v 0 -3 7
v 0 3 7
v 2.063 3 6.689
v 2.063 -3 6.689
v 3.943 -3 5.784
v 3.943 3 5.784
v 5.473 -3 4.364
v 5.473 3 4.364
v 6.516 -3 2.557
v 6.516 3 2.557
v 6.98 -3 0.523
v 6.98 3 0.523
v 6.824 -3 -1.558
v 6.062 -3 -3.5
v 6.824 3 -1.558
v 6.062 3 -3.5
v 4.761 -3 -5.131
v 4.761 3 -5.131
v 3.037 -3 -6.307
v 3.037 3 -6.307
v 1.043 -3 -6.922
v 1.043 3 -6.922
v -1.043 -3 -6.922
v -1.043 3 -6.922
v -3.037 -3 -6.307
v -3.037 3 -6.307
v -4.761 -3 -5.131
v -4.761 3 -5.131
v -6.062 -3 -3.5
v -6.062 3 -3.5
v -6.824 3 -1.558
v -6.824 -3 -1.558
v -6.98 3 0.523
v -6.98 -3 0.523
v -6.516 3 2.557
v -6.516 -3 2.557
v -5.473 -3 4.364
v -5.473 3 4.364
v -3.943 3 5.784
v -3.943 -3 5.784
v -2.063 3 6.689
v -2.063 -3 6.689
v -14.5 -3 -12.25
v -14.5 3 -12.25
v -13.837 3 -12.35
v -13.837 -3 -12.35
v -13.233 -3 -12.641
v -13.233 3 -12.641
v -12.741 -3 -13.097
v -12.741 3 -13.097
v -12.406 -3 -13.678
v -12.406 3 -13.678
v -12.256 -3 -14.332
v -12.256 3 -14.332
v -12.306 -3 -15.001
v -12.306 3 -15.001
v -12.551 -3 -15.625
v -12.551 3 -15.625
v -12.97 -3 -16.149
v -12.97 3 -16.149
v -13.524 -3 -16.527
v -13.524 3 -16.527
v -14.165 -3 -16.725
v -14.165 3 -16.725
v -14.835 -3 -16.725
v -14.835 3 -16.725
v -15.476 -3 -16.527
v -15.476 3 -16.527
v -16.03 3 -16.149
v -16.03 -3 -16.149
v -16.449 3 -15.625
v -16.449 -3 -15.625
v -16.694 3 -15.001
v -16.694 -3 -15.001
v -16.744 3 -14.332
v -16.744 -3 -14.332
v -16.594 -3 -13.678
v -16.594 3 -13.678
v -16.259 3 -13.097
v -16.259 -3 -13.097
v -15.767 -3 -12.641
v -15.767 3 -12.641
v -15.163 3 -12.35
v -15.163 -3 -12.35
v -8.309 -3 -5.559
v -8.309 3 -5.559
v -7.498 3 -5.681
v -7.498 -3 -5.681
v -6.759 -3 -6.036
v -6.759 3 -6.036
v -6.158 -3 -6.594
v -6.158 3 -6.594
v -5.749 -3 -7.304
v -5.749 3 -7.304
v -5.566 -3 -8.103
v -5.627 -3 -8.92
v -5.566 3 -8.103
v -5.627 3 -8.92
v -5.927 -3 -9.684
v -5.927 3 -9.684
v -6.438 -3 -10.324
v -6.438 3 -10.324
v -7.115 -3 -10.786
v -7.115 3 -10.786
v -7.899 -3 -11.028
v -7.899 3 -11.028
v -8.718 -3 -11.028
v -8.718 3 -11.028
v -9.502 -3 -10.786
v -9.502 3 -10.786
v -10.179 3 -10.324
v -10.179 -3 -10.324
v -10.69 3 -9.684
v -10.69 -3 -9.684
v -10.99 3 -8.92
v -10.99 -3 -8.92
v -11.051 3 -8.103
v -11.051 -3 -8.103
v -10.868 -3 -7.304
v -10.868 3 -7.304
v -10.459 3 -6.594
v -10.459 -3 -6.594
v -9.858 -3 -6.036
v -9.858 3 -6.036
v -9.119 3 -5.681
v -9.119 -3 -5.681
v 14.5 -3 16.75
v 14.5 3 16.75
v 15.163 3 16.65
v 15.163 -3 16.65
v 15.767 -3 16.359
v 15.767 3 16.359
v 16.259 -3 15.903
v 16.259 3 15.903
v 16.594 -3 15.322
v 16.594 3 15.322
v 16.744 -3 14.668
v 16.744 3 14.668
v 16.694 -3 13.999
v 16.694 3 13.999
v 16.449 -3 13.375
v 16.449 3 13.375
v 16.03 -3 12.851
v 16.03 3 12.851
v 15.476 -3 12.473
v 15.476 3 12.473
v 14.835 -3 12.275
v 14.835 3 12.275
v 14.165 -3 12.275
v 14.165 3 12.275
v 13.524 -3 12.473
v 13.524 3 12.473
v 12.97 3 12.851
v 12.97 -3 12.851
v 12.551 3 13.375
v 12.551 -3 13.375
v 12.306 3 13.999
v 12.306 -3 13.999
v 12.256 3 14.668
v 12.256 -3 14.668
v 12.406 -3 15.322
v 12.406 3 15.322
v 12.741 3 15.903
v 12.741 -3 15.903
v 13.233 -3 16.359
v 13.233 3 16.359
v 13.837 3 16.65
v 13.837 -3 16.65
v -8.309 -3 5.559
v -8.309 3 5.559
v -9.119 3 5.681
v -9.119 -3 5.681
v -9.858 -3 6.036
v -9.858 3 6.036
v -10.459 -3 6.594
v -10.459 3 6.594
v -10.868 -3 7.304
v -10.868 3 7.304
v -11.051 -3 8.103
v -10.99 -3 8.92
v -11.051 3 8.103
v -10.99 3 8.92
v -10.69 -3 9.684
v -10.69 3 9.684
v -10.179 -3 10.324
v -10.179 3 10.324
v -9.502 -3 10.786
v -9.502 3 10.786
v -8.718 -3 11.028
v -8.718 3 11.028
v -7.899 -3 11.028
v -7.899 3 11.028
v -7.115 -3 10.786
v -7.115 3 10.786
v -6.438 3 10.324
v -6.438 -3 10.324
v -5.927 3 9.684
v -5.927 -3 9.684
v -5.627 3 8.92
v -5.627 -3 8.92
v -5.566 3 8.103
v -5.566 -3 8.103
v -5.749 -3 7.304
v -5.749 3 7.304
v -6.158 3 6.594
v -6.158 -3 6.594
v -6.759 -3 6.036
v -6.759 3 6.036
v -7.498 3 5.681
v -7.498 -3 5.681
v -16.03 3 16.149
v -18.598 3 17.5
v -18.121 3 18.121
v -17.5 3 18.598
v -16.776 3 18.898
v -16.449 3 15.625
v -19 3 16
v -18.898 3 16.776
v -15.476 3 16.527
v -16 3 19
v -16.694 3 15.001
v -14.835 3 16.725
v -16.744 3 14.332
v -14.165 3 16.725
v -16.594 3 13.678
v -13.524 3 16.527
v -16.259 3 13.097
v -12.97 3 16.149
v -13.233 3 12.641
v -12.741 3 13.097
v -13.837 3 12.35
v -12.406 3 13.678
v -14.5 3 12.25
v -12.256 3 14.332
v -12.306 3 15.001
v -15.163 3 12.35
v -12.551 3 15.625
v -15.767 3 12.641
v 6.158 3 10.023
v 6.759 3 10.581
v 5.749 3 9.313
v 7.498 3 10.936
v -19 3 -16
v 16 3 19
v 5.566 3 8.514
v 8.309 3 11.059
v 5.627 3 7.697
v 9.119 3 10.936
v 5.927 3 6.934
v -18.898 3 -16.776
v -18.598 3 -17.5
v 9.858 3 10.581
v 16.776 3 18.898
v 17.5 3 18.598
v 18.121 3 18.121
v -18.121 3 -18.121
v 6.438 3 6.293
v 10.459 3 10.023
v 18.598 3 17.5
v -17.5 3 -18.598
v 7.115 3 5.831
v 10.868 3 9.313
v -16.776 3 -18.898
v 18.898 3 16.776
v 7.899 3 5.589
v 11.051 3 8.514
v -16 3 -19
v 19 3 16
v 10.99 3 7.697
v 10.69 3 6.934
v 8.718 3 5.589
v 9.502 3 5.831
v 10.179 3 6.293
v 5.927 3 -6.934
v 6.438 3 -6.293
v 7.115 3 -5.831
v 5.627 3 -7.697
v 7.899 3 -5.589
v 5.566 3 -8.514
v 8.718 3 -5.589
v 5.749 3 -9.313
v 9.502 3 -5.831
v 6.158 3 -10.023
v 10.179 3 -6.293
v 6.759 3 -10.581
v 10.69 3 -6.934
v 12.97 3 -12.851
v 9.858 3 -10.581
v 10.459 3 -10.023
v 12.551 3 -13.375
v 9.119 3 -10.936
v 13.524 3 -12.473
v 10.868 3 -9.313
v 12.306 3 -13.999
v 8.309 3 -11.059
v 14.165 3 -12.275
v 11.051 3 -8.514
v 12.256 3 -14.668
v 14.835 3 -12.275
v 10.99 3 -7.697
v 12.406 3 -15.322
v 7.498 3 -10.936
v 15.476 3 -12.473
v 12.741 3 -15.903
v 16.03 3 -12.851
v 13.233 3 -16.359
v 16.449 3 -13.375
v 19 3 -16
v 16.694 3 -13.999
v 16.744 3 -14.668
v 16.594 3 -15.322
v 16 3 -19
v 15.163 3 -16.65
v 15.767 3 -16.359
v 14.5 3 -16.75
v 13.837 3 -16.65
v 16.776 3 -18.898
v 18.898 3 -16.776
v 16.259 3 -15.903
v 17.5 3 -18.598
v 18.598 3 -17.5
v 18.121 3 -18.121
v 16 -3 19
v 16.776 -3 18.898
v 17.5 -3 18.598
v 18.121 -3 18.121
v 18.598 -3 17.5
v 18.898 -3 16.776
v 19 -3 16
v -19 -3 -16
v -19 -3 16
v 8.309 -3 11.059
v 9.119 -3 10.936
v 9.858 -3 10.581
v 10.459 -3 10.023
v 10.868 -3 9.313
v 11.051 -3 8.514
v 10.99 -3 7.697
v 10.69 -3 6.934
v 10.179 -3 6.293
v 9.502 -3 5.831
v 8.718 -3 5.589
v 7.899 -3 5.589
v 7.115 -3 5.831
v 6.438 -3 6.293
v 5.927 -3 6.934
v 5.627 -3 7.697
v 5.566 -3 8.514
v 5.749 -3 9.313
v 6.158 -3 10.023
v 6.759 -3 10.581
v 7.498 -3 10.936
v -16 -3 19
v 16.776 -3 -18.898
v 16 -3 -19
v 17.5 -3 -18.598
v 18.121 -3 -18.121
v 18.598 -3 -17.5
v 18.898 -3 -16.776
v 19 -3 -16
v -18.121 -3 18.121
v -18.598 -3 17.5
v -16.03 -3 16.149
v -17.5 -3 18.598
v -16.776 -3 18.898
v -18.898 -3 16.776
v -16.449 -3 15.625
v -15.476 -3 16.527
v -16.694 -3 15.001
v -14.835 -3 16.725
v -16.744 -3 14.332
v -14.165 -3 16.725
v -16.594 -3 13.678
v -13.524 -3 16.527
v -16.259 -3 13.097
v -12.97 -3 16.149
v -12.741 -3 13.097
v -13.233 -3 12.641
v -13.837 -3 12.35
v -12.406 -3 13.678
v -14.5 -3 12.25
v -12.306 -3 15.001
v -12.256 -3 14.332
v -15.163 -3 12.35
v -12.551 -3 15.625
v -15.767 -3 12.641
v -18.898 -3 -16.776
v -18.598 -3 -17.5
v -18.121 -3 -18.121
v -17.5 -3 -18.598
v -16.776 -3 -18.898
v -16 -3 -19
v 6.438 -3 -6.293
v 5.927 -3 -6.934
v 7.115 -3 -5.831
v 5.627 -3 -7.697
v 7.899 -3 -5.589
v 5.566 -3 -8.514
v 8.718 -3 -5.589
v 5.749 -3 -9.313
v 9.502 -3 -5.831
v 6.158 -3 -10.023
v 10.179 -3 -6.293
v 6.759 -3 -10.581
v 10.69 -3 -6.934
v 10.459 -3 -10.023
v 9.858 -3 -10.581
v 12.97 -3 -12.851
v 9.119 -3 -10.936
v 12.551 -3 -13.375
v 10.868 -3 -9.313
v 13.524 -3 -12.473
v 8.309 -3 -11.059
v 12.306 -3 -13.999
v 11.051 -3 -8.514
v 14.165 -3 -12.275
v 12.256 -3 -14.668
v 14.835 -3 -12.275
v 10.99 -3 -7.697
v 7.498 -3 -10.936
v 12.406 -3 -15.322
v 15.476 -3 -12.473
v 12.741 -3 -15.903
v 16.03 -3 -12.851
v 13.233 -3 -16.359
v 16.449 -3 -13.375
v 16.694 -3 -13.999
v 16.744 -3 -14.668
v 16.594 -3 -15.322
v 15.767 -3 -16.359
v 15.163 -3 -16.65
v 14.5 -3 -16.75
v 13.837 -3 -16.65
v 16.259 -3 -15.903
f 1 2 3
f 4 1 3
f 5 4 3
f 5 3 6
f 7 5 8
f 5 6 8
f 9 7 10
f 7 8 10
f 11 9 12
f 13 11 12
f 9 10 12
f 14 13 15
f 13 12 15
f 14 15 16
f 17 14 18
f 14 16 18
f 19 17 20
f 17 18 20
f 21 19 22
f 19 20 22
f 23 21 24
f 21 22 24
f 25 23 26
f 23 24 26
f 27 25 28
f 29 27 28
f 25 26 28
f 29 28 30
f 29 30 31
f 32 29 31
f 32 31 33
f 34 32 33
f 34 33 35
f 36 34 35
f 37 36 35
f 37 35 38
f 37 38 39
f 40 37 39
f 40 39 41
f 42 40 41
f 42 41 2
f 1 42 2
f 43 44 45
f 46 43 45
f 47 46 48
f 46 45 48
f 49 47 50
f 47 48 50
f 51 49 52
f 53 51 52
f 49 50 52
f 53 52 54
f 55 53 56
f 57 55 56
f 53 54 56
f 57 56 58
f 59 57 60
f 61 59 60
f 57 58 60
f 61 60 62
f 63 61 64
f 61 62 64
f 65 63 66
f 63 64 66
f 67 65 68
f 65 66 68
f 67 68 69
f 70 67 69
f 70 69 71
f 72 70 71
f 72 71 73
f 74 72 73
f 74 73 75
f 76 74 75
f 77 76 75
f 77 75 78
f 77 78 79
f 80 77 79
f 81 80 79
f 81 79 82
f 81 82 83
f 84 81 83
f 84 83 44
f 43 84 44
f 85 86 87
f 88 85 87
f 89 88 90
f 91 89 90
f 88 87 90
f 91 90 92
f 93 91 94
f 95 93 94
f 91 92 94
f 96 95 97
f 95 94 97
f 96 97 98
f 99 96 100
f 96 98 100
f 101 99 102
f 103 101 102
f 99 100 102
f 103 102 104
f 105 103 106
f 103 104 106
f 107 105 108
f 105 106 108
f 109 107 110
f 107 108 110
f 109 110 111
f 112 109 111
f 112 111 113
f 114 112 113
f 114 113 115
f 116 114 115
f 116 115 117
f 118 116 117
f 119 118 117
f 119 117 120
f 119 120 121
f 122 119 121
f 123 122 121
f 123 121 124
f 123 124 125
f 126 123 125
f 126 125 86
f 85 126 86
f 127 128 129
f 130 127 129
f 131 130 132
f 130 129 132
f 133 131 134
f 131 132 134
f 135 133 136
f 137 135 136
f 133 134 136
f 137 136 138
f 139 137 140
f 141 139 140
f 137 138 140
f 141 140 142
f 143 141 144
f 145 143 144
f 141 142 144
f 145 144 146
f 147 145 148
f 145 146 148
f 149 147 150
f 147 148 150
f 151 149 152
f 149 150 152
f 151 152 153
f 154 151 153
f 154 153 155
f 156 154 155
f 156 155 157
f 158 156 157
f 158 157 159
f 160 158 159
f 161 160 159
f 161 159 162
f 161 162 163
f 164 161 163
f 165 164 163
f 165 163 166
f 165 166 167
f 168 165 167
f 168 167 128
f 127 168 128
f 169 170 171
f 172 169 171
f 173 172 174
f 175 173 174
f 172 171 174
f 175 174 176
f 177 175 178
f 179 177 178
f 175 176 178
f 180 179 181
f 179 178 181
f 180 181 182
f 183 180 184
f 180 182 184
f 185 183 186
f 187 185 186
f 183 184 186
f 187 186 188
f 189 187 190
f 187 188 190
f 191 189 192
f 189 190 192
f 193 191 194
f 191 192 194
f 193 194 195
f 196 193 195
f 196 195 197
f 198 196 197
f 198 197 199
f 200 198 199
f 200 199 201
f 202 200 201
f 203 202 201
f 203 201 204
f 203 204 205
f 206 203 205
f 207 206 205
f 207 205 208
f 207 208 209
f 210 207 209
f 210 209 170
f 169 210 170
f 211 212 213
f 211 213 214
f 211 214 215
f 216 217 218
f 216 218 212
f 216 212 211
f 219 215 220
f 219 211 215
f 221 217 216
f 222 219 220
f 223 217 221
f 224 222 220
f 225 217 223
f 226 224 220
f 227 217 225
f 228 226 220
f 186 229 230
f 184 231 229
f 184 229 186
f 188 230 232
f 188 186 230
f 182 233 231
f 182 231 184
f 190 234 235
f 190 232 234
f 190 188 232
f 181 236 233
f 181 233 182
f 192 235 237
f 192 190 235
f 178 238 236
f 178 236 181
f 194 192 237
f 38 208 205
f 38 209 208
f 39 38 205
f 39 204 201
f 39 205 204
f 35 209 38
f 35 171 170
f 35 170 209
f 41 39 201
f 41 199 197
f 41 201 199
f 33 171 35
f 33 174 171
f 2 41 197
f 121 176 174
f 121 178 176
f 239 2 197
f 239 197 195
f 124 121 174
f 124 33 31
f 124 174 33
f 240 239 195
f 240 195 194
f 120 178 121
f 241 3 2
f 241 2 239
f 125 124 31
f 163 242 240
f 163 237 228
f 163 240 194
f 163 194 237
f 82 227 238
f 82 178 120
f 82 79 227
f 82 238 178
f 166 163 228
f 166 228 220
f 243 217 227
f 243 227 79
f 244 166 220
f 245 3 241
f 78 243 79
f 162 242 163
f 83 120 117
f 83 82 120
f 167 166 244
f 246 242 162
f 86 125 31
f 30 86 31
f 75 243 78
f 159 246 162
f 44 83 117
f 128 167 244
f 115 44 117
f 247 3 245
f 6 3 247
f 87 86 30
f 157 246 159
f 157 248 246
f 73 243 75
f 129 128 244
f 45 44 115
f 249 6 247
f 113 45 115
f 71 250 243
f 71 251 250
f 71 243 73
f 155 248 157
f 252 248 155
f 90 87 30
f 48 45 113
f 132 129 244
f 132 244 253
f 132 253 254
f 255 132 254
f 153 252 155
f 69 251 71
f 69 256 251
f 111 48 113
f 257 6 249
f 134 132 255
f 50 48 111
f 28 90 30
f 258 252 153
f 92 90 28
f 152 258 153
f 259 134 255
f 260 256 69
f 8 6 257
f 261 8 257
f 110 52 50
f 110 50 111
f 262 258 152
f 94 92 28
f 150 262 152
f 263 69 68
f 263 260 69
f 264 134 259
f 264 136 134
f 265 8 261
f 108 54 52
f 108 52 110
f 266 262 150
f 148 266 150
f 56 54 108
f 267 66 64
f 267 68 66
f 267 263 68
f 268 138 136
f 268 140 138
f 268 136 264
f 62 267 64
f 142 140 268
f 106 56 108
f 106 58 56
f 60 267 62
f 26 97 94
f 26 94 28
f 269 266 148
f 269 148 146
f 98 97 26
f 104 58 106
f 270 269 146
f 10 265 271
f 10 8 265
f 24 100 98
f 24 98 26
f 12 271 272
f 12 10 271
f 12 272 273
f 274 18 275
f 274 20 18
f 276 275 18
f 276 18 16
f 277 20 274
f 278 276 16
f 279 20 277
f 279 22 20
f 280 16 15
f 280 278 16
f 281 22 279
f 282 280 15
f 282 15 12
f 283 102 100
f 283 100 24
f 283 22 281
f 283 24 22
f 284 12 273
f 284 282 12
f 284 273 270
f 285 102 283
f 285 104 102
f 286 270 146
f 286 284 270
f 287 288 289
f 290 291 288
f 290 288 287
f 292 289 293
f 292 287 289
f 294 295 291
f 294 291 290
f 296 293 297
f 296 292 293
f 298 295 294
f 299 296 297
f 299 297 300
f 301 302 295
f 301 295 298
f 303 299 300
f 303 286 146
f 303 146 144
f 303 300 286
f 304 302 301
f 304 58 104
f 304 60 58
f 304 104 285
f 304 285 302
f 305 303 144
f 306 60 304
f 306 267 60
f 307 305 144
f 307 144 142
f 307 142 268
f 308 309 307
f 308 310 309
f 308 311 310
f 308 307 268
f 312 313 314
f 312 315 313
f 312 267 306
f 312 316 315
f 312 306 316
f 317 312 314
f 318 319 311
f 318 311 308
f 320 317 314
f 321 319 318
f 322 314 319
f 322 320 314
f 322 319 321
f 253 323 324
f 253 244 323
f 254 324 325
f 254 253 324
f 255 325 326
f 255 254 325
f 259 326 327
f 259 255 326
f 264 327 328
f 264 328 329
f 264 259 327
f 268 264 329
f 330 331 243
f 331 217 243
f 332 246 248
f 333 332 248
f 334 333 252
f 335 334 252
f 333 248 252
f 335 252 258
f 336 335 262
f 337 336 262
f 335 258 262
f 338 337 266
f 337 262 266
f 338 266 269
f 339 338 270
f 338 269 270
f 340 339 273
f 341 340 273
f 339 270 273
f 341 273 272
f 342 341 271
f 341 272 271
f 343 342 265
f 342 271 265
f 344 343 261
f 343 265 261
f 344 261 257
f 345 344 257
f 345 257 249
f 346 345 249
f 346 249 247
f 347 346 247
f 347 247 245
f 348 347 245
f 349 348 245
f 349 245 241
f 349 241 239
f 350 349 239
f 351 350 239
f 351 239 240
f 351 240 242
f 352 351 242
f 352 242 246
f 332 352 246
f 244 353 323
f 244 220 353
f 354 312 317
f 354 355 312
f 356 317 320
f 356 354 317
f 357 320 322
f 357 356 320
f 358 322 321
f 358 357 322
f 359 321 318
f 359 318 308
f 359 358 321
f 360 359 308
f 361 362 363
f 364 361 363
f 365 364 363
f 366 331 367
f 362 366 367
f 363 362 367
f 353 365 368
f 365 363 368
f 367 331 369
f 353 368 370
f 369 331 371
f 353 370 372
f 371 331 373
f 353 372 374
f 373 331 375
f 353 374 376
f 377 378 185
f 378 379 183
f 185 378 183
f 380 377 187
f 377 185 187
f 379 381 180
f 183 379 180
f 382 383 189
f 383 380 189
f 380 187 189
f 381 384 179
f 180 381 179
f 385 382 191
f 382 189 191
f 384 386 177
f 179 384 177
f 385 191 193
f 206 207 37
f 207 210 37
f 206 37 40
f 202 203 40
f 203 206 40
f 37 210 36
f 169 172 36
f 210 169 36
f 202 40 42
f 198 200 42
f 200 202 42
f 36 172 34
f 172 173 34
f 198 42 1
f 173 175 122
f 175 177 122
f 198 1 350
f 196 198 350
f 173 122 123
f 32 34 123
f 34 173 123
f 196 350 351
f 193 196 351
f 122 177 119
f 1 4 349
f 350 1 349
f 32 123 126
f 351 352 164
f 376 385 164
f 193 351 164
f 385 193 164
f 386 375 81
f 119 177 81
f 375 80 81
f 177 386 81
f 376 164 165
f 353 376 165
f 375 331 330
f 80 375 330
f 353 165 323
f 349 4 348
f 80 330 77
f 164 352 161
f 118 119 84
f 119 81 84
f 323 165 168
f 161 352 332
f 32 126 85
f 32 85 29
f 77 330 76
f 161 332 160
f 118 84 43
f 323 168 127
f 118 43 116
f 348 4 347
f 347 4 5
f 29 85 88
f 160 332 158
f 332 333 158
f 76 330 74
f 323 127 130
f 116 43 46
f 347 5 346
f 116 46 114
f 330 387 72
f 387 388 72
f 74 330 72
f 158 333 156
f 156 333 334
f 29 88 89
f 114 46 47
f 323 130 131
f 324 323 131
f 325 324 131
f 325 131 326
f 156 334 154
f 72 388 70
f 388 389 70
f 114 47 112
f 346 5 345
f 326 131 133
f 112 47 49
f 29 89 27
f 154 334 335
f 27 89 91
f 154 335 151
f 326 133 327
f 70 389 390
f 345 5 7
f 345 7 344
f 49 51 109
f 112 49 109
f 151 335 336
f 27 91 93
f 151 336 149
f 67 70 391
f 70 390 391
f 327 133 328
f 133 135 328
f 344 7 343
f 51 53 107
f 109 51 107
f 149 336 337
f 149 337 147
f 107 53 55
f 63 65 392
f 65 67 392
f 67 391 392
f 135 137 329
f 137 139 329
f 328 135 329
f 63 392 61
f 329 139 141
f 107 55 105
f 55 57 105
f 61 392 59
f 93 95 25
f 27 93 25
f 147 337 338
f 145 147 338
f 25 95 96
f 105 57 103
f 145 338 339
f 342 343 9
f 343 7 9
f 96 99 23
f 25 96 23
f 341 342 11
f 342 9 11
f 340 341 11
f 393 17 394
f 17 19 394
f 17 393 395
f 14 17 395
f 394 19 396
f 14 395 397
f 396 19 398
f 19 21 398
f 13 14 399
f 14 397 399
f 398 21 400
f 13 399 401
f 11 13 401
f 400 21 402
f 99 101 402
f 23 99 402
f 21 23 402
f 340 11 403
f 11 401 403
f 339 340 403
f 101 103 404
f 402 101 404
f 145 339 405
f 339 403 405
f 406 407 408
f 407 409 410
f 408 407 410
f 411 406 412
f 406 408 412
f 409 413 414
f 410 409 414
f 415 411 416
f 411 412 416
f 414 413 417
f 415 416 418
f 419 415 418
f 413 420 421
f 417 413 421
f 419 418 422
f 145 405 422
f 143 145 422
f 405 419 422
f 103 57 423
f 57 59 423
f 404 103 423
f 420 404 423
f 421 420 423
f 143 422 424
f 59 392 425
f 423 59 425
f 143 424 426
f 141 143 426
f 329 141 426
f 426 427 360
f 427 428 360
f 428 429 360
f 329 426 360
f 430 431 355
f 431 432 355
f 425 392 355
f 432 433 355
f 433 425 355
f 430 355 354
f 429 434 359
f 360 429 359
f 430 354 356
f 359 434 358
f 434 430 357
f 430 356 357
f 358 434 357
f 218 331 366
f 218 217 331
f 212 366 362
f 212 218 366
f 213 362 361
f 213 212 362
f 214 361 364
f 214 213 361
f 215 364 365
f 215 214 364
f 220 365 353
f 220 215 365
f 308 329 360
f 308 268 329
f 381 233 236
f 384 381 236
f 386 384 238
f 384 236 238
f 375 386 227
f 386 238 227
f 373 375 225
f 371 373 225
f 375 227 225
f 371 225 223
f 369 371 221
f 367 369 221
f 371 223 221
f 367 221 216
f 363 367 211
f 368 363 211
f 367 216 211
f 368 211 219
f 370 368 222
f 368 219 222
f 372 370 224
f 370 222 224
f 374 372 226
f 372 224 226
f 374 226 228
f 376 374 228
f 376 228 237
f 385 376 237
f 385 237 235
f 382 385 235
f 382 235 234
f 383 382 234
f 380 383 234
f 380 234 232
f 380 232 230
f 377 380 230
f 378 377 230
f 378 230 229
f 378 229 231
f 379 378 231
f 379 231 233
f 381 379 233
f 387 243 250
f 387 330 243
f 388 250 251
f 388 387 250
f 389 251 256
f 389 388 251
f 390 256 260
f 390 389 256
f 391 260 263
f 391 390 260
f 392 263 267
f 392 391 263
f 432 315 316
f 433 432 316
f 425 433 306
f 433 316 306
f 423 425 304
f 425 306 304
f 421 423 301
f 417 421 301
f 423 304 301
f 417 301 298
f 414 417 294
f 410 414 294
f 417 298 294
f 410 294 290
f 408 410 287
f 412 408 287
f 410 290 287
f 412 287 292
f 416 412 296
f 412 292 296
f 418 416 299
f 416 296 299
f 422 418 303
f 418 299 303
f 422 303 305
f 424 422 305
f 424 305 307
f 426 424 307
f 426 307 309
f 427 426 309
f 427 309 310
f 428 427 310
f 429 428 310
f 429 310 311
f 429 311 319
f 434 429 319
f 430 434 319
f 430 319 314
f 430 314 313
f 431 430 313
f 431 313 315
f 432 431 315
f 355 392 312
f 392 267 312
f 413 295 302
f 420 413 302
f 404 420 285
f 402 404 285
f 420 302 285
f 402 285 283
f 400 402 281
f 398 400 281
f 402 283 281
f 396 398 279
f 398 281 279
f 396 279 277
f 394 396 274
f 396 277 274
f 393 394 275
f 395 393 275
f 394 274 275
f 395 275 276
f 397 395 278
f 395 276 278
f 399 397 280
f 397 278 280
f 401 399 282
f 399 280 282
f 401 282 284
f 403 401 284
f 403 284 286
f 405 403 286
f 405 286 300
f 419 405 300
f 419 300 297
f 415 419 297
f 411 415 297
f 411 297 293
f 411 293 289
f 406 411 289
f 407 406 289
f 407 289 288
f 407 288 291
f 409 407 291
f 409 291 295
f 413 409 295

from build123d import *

# Parameters (mm, degrees)
SKETCH_1_W          = 38
SKETCH_1_H          = 38
EXTRUDE_1_DEPTH     = 3
SKETCH_2_R          = 2.25
CUT_EXTRUDE_1_DEPTH = 28.531799796
SKETCH_3_R          = 2.75
SKETCH_3_R_2        = 7
CUT_EXTRUDE_2_DEPTH = 28.531799796
FILLET_1_R          = 3


with BuildPart() as part:
    # 草图1 → 凸台-拉伸1 (new, symmetric)
    with BuildSketch(Plane(origin=(0, 0, 0), x_dir=(1, 0, 0), z_dir=(0, 1, 0))):
        Rectangle(SKETCH_1_W, SKETCH_1_H)
    extrude(amount=EXTRUDE_1_DEPTH, both=True)

    # 草图2 → 切除-拉伸1 (cut, through all)
    with BuildSketch(Plane(origin=(0, 3, 0), x_dir=(1, 0, 0), z_dir=(0, 1, 0))):
        with Locations(Location((-14.5, 14.5, 0), (0, 0, 270))):
            Circle(SKETCH_2_R)
        with Locations(Location((-14.5, -14.5, 0), (0, 0, 90))):
            Circle(SKETCH_2_R)
        with Locations(Location((14.5, -14.5, 0), (0, 0, 270))):
            Circle(SKETCH_2_R)
        with Locations(Location((14.5, 14.5, 0), (0, 0, 90))):
            Circle(SKETCH_2_R)
    extrude(amount=-CUT_EXTRUDE_1_DEPTH, mode=Mode.SUBTRACT)

    # 草图3 → 切除-拉伸2 (cut, through all)
    with BuildSketch(Plane(origin=(0, 3, 0), x_dir=(1, 0, 0), z_dir=(0, 1, 0))):
        with Locations(Location((-8.308504679, 8.308504679, 0), (0, 0, 270))):
            Circle(SKETCH_3_R)
        with Locations(Location((-8.308504679, -8.308504679, 0), (0, 0, 90))):
            Circle(SKETCH_3_R)
        with Locations(Location((8.308504679, -8.308504679, 0), (0, 0, 270))):
            Circle(SKETCH_3_R)
        with Locations(Location((8.308504679, 8.308504679, 0), (0, 0, 90))):
            Circle(SKETCH_3_R)
        with Locations(Location((0, 0, 0), (0, 0, 270))):
            Circle(SKETCH_3_R_2)
    extrude(amount=-CUT_EXTRUDE_2_DEPTH, mode=Mode.SUBTRACT)

    # 圆角1
    fillet_1_edges = [part.edges().sort_by_distance(p)[0] for p in [
        (-19, 0, -19),
        (19, 0, -19),
        (19, 0, 19),
        (-19, 0, 19),
    ]]
    fillet(fillet_1_edges, radius=FILLET_1_R)


solid = part.part
